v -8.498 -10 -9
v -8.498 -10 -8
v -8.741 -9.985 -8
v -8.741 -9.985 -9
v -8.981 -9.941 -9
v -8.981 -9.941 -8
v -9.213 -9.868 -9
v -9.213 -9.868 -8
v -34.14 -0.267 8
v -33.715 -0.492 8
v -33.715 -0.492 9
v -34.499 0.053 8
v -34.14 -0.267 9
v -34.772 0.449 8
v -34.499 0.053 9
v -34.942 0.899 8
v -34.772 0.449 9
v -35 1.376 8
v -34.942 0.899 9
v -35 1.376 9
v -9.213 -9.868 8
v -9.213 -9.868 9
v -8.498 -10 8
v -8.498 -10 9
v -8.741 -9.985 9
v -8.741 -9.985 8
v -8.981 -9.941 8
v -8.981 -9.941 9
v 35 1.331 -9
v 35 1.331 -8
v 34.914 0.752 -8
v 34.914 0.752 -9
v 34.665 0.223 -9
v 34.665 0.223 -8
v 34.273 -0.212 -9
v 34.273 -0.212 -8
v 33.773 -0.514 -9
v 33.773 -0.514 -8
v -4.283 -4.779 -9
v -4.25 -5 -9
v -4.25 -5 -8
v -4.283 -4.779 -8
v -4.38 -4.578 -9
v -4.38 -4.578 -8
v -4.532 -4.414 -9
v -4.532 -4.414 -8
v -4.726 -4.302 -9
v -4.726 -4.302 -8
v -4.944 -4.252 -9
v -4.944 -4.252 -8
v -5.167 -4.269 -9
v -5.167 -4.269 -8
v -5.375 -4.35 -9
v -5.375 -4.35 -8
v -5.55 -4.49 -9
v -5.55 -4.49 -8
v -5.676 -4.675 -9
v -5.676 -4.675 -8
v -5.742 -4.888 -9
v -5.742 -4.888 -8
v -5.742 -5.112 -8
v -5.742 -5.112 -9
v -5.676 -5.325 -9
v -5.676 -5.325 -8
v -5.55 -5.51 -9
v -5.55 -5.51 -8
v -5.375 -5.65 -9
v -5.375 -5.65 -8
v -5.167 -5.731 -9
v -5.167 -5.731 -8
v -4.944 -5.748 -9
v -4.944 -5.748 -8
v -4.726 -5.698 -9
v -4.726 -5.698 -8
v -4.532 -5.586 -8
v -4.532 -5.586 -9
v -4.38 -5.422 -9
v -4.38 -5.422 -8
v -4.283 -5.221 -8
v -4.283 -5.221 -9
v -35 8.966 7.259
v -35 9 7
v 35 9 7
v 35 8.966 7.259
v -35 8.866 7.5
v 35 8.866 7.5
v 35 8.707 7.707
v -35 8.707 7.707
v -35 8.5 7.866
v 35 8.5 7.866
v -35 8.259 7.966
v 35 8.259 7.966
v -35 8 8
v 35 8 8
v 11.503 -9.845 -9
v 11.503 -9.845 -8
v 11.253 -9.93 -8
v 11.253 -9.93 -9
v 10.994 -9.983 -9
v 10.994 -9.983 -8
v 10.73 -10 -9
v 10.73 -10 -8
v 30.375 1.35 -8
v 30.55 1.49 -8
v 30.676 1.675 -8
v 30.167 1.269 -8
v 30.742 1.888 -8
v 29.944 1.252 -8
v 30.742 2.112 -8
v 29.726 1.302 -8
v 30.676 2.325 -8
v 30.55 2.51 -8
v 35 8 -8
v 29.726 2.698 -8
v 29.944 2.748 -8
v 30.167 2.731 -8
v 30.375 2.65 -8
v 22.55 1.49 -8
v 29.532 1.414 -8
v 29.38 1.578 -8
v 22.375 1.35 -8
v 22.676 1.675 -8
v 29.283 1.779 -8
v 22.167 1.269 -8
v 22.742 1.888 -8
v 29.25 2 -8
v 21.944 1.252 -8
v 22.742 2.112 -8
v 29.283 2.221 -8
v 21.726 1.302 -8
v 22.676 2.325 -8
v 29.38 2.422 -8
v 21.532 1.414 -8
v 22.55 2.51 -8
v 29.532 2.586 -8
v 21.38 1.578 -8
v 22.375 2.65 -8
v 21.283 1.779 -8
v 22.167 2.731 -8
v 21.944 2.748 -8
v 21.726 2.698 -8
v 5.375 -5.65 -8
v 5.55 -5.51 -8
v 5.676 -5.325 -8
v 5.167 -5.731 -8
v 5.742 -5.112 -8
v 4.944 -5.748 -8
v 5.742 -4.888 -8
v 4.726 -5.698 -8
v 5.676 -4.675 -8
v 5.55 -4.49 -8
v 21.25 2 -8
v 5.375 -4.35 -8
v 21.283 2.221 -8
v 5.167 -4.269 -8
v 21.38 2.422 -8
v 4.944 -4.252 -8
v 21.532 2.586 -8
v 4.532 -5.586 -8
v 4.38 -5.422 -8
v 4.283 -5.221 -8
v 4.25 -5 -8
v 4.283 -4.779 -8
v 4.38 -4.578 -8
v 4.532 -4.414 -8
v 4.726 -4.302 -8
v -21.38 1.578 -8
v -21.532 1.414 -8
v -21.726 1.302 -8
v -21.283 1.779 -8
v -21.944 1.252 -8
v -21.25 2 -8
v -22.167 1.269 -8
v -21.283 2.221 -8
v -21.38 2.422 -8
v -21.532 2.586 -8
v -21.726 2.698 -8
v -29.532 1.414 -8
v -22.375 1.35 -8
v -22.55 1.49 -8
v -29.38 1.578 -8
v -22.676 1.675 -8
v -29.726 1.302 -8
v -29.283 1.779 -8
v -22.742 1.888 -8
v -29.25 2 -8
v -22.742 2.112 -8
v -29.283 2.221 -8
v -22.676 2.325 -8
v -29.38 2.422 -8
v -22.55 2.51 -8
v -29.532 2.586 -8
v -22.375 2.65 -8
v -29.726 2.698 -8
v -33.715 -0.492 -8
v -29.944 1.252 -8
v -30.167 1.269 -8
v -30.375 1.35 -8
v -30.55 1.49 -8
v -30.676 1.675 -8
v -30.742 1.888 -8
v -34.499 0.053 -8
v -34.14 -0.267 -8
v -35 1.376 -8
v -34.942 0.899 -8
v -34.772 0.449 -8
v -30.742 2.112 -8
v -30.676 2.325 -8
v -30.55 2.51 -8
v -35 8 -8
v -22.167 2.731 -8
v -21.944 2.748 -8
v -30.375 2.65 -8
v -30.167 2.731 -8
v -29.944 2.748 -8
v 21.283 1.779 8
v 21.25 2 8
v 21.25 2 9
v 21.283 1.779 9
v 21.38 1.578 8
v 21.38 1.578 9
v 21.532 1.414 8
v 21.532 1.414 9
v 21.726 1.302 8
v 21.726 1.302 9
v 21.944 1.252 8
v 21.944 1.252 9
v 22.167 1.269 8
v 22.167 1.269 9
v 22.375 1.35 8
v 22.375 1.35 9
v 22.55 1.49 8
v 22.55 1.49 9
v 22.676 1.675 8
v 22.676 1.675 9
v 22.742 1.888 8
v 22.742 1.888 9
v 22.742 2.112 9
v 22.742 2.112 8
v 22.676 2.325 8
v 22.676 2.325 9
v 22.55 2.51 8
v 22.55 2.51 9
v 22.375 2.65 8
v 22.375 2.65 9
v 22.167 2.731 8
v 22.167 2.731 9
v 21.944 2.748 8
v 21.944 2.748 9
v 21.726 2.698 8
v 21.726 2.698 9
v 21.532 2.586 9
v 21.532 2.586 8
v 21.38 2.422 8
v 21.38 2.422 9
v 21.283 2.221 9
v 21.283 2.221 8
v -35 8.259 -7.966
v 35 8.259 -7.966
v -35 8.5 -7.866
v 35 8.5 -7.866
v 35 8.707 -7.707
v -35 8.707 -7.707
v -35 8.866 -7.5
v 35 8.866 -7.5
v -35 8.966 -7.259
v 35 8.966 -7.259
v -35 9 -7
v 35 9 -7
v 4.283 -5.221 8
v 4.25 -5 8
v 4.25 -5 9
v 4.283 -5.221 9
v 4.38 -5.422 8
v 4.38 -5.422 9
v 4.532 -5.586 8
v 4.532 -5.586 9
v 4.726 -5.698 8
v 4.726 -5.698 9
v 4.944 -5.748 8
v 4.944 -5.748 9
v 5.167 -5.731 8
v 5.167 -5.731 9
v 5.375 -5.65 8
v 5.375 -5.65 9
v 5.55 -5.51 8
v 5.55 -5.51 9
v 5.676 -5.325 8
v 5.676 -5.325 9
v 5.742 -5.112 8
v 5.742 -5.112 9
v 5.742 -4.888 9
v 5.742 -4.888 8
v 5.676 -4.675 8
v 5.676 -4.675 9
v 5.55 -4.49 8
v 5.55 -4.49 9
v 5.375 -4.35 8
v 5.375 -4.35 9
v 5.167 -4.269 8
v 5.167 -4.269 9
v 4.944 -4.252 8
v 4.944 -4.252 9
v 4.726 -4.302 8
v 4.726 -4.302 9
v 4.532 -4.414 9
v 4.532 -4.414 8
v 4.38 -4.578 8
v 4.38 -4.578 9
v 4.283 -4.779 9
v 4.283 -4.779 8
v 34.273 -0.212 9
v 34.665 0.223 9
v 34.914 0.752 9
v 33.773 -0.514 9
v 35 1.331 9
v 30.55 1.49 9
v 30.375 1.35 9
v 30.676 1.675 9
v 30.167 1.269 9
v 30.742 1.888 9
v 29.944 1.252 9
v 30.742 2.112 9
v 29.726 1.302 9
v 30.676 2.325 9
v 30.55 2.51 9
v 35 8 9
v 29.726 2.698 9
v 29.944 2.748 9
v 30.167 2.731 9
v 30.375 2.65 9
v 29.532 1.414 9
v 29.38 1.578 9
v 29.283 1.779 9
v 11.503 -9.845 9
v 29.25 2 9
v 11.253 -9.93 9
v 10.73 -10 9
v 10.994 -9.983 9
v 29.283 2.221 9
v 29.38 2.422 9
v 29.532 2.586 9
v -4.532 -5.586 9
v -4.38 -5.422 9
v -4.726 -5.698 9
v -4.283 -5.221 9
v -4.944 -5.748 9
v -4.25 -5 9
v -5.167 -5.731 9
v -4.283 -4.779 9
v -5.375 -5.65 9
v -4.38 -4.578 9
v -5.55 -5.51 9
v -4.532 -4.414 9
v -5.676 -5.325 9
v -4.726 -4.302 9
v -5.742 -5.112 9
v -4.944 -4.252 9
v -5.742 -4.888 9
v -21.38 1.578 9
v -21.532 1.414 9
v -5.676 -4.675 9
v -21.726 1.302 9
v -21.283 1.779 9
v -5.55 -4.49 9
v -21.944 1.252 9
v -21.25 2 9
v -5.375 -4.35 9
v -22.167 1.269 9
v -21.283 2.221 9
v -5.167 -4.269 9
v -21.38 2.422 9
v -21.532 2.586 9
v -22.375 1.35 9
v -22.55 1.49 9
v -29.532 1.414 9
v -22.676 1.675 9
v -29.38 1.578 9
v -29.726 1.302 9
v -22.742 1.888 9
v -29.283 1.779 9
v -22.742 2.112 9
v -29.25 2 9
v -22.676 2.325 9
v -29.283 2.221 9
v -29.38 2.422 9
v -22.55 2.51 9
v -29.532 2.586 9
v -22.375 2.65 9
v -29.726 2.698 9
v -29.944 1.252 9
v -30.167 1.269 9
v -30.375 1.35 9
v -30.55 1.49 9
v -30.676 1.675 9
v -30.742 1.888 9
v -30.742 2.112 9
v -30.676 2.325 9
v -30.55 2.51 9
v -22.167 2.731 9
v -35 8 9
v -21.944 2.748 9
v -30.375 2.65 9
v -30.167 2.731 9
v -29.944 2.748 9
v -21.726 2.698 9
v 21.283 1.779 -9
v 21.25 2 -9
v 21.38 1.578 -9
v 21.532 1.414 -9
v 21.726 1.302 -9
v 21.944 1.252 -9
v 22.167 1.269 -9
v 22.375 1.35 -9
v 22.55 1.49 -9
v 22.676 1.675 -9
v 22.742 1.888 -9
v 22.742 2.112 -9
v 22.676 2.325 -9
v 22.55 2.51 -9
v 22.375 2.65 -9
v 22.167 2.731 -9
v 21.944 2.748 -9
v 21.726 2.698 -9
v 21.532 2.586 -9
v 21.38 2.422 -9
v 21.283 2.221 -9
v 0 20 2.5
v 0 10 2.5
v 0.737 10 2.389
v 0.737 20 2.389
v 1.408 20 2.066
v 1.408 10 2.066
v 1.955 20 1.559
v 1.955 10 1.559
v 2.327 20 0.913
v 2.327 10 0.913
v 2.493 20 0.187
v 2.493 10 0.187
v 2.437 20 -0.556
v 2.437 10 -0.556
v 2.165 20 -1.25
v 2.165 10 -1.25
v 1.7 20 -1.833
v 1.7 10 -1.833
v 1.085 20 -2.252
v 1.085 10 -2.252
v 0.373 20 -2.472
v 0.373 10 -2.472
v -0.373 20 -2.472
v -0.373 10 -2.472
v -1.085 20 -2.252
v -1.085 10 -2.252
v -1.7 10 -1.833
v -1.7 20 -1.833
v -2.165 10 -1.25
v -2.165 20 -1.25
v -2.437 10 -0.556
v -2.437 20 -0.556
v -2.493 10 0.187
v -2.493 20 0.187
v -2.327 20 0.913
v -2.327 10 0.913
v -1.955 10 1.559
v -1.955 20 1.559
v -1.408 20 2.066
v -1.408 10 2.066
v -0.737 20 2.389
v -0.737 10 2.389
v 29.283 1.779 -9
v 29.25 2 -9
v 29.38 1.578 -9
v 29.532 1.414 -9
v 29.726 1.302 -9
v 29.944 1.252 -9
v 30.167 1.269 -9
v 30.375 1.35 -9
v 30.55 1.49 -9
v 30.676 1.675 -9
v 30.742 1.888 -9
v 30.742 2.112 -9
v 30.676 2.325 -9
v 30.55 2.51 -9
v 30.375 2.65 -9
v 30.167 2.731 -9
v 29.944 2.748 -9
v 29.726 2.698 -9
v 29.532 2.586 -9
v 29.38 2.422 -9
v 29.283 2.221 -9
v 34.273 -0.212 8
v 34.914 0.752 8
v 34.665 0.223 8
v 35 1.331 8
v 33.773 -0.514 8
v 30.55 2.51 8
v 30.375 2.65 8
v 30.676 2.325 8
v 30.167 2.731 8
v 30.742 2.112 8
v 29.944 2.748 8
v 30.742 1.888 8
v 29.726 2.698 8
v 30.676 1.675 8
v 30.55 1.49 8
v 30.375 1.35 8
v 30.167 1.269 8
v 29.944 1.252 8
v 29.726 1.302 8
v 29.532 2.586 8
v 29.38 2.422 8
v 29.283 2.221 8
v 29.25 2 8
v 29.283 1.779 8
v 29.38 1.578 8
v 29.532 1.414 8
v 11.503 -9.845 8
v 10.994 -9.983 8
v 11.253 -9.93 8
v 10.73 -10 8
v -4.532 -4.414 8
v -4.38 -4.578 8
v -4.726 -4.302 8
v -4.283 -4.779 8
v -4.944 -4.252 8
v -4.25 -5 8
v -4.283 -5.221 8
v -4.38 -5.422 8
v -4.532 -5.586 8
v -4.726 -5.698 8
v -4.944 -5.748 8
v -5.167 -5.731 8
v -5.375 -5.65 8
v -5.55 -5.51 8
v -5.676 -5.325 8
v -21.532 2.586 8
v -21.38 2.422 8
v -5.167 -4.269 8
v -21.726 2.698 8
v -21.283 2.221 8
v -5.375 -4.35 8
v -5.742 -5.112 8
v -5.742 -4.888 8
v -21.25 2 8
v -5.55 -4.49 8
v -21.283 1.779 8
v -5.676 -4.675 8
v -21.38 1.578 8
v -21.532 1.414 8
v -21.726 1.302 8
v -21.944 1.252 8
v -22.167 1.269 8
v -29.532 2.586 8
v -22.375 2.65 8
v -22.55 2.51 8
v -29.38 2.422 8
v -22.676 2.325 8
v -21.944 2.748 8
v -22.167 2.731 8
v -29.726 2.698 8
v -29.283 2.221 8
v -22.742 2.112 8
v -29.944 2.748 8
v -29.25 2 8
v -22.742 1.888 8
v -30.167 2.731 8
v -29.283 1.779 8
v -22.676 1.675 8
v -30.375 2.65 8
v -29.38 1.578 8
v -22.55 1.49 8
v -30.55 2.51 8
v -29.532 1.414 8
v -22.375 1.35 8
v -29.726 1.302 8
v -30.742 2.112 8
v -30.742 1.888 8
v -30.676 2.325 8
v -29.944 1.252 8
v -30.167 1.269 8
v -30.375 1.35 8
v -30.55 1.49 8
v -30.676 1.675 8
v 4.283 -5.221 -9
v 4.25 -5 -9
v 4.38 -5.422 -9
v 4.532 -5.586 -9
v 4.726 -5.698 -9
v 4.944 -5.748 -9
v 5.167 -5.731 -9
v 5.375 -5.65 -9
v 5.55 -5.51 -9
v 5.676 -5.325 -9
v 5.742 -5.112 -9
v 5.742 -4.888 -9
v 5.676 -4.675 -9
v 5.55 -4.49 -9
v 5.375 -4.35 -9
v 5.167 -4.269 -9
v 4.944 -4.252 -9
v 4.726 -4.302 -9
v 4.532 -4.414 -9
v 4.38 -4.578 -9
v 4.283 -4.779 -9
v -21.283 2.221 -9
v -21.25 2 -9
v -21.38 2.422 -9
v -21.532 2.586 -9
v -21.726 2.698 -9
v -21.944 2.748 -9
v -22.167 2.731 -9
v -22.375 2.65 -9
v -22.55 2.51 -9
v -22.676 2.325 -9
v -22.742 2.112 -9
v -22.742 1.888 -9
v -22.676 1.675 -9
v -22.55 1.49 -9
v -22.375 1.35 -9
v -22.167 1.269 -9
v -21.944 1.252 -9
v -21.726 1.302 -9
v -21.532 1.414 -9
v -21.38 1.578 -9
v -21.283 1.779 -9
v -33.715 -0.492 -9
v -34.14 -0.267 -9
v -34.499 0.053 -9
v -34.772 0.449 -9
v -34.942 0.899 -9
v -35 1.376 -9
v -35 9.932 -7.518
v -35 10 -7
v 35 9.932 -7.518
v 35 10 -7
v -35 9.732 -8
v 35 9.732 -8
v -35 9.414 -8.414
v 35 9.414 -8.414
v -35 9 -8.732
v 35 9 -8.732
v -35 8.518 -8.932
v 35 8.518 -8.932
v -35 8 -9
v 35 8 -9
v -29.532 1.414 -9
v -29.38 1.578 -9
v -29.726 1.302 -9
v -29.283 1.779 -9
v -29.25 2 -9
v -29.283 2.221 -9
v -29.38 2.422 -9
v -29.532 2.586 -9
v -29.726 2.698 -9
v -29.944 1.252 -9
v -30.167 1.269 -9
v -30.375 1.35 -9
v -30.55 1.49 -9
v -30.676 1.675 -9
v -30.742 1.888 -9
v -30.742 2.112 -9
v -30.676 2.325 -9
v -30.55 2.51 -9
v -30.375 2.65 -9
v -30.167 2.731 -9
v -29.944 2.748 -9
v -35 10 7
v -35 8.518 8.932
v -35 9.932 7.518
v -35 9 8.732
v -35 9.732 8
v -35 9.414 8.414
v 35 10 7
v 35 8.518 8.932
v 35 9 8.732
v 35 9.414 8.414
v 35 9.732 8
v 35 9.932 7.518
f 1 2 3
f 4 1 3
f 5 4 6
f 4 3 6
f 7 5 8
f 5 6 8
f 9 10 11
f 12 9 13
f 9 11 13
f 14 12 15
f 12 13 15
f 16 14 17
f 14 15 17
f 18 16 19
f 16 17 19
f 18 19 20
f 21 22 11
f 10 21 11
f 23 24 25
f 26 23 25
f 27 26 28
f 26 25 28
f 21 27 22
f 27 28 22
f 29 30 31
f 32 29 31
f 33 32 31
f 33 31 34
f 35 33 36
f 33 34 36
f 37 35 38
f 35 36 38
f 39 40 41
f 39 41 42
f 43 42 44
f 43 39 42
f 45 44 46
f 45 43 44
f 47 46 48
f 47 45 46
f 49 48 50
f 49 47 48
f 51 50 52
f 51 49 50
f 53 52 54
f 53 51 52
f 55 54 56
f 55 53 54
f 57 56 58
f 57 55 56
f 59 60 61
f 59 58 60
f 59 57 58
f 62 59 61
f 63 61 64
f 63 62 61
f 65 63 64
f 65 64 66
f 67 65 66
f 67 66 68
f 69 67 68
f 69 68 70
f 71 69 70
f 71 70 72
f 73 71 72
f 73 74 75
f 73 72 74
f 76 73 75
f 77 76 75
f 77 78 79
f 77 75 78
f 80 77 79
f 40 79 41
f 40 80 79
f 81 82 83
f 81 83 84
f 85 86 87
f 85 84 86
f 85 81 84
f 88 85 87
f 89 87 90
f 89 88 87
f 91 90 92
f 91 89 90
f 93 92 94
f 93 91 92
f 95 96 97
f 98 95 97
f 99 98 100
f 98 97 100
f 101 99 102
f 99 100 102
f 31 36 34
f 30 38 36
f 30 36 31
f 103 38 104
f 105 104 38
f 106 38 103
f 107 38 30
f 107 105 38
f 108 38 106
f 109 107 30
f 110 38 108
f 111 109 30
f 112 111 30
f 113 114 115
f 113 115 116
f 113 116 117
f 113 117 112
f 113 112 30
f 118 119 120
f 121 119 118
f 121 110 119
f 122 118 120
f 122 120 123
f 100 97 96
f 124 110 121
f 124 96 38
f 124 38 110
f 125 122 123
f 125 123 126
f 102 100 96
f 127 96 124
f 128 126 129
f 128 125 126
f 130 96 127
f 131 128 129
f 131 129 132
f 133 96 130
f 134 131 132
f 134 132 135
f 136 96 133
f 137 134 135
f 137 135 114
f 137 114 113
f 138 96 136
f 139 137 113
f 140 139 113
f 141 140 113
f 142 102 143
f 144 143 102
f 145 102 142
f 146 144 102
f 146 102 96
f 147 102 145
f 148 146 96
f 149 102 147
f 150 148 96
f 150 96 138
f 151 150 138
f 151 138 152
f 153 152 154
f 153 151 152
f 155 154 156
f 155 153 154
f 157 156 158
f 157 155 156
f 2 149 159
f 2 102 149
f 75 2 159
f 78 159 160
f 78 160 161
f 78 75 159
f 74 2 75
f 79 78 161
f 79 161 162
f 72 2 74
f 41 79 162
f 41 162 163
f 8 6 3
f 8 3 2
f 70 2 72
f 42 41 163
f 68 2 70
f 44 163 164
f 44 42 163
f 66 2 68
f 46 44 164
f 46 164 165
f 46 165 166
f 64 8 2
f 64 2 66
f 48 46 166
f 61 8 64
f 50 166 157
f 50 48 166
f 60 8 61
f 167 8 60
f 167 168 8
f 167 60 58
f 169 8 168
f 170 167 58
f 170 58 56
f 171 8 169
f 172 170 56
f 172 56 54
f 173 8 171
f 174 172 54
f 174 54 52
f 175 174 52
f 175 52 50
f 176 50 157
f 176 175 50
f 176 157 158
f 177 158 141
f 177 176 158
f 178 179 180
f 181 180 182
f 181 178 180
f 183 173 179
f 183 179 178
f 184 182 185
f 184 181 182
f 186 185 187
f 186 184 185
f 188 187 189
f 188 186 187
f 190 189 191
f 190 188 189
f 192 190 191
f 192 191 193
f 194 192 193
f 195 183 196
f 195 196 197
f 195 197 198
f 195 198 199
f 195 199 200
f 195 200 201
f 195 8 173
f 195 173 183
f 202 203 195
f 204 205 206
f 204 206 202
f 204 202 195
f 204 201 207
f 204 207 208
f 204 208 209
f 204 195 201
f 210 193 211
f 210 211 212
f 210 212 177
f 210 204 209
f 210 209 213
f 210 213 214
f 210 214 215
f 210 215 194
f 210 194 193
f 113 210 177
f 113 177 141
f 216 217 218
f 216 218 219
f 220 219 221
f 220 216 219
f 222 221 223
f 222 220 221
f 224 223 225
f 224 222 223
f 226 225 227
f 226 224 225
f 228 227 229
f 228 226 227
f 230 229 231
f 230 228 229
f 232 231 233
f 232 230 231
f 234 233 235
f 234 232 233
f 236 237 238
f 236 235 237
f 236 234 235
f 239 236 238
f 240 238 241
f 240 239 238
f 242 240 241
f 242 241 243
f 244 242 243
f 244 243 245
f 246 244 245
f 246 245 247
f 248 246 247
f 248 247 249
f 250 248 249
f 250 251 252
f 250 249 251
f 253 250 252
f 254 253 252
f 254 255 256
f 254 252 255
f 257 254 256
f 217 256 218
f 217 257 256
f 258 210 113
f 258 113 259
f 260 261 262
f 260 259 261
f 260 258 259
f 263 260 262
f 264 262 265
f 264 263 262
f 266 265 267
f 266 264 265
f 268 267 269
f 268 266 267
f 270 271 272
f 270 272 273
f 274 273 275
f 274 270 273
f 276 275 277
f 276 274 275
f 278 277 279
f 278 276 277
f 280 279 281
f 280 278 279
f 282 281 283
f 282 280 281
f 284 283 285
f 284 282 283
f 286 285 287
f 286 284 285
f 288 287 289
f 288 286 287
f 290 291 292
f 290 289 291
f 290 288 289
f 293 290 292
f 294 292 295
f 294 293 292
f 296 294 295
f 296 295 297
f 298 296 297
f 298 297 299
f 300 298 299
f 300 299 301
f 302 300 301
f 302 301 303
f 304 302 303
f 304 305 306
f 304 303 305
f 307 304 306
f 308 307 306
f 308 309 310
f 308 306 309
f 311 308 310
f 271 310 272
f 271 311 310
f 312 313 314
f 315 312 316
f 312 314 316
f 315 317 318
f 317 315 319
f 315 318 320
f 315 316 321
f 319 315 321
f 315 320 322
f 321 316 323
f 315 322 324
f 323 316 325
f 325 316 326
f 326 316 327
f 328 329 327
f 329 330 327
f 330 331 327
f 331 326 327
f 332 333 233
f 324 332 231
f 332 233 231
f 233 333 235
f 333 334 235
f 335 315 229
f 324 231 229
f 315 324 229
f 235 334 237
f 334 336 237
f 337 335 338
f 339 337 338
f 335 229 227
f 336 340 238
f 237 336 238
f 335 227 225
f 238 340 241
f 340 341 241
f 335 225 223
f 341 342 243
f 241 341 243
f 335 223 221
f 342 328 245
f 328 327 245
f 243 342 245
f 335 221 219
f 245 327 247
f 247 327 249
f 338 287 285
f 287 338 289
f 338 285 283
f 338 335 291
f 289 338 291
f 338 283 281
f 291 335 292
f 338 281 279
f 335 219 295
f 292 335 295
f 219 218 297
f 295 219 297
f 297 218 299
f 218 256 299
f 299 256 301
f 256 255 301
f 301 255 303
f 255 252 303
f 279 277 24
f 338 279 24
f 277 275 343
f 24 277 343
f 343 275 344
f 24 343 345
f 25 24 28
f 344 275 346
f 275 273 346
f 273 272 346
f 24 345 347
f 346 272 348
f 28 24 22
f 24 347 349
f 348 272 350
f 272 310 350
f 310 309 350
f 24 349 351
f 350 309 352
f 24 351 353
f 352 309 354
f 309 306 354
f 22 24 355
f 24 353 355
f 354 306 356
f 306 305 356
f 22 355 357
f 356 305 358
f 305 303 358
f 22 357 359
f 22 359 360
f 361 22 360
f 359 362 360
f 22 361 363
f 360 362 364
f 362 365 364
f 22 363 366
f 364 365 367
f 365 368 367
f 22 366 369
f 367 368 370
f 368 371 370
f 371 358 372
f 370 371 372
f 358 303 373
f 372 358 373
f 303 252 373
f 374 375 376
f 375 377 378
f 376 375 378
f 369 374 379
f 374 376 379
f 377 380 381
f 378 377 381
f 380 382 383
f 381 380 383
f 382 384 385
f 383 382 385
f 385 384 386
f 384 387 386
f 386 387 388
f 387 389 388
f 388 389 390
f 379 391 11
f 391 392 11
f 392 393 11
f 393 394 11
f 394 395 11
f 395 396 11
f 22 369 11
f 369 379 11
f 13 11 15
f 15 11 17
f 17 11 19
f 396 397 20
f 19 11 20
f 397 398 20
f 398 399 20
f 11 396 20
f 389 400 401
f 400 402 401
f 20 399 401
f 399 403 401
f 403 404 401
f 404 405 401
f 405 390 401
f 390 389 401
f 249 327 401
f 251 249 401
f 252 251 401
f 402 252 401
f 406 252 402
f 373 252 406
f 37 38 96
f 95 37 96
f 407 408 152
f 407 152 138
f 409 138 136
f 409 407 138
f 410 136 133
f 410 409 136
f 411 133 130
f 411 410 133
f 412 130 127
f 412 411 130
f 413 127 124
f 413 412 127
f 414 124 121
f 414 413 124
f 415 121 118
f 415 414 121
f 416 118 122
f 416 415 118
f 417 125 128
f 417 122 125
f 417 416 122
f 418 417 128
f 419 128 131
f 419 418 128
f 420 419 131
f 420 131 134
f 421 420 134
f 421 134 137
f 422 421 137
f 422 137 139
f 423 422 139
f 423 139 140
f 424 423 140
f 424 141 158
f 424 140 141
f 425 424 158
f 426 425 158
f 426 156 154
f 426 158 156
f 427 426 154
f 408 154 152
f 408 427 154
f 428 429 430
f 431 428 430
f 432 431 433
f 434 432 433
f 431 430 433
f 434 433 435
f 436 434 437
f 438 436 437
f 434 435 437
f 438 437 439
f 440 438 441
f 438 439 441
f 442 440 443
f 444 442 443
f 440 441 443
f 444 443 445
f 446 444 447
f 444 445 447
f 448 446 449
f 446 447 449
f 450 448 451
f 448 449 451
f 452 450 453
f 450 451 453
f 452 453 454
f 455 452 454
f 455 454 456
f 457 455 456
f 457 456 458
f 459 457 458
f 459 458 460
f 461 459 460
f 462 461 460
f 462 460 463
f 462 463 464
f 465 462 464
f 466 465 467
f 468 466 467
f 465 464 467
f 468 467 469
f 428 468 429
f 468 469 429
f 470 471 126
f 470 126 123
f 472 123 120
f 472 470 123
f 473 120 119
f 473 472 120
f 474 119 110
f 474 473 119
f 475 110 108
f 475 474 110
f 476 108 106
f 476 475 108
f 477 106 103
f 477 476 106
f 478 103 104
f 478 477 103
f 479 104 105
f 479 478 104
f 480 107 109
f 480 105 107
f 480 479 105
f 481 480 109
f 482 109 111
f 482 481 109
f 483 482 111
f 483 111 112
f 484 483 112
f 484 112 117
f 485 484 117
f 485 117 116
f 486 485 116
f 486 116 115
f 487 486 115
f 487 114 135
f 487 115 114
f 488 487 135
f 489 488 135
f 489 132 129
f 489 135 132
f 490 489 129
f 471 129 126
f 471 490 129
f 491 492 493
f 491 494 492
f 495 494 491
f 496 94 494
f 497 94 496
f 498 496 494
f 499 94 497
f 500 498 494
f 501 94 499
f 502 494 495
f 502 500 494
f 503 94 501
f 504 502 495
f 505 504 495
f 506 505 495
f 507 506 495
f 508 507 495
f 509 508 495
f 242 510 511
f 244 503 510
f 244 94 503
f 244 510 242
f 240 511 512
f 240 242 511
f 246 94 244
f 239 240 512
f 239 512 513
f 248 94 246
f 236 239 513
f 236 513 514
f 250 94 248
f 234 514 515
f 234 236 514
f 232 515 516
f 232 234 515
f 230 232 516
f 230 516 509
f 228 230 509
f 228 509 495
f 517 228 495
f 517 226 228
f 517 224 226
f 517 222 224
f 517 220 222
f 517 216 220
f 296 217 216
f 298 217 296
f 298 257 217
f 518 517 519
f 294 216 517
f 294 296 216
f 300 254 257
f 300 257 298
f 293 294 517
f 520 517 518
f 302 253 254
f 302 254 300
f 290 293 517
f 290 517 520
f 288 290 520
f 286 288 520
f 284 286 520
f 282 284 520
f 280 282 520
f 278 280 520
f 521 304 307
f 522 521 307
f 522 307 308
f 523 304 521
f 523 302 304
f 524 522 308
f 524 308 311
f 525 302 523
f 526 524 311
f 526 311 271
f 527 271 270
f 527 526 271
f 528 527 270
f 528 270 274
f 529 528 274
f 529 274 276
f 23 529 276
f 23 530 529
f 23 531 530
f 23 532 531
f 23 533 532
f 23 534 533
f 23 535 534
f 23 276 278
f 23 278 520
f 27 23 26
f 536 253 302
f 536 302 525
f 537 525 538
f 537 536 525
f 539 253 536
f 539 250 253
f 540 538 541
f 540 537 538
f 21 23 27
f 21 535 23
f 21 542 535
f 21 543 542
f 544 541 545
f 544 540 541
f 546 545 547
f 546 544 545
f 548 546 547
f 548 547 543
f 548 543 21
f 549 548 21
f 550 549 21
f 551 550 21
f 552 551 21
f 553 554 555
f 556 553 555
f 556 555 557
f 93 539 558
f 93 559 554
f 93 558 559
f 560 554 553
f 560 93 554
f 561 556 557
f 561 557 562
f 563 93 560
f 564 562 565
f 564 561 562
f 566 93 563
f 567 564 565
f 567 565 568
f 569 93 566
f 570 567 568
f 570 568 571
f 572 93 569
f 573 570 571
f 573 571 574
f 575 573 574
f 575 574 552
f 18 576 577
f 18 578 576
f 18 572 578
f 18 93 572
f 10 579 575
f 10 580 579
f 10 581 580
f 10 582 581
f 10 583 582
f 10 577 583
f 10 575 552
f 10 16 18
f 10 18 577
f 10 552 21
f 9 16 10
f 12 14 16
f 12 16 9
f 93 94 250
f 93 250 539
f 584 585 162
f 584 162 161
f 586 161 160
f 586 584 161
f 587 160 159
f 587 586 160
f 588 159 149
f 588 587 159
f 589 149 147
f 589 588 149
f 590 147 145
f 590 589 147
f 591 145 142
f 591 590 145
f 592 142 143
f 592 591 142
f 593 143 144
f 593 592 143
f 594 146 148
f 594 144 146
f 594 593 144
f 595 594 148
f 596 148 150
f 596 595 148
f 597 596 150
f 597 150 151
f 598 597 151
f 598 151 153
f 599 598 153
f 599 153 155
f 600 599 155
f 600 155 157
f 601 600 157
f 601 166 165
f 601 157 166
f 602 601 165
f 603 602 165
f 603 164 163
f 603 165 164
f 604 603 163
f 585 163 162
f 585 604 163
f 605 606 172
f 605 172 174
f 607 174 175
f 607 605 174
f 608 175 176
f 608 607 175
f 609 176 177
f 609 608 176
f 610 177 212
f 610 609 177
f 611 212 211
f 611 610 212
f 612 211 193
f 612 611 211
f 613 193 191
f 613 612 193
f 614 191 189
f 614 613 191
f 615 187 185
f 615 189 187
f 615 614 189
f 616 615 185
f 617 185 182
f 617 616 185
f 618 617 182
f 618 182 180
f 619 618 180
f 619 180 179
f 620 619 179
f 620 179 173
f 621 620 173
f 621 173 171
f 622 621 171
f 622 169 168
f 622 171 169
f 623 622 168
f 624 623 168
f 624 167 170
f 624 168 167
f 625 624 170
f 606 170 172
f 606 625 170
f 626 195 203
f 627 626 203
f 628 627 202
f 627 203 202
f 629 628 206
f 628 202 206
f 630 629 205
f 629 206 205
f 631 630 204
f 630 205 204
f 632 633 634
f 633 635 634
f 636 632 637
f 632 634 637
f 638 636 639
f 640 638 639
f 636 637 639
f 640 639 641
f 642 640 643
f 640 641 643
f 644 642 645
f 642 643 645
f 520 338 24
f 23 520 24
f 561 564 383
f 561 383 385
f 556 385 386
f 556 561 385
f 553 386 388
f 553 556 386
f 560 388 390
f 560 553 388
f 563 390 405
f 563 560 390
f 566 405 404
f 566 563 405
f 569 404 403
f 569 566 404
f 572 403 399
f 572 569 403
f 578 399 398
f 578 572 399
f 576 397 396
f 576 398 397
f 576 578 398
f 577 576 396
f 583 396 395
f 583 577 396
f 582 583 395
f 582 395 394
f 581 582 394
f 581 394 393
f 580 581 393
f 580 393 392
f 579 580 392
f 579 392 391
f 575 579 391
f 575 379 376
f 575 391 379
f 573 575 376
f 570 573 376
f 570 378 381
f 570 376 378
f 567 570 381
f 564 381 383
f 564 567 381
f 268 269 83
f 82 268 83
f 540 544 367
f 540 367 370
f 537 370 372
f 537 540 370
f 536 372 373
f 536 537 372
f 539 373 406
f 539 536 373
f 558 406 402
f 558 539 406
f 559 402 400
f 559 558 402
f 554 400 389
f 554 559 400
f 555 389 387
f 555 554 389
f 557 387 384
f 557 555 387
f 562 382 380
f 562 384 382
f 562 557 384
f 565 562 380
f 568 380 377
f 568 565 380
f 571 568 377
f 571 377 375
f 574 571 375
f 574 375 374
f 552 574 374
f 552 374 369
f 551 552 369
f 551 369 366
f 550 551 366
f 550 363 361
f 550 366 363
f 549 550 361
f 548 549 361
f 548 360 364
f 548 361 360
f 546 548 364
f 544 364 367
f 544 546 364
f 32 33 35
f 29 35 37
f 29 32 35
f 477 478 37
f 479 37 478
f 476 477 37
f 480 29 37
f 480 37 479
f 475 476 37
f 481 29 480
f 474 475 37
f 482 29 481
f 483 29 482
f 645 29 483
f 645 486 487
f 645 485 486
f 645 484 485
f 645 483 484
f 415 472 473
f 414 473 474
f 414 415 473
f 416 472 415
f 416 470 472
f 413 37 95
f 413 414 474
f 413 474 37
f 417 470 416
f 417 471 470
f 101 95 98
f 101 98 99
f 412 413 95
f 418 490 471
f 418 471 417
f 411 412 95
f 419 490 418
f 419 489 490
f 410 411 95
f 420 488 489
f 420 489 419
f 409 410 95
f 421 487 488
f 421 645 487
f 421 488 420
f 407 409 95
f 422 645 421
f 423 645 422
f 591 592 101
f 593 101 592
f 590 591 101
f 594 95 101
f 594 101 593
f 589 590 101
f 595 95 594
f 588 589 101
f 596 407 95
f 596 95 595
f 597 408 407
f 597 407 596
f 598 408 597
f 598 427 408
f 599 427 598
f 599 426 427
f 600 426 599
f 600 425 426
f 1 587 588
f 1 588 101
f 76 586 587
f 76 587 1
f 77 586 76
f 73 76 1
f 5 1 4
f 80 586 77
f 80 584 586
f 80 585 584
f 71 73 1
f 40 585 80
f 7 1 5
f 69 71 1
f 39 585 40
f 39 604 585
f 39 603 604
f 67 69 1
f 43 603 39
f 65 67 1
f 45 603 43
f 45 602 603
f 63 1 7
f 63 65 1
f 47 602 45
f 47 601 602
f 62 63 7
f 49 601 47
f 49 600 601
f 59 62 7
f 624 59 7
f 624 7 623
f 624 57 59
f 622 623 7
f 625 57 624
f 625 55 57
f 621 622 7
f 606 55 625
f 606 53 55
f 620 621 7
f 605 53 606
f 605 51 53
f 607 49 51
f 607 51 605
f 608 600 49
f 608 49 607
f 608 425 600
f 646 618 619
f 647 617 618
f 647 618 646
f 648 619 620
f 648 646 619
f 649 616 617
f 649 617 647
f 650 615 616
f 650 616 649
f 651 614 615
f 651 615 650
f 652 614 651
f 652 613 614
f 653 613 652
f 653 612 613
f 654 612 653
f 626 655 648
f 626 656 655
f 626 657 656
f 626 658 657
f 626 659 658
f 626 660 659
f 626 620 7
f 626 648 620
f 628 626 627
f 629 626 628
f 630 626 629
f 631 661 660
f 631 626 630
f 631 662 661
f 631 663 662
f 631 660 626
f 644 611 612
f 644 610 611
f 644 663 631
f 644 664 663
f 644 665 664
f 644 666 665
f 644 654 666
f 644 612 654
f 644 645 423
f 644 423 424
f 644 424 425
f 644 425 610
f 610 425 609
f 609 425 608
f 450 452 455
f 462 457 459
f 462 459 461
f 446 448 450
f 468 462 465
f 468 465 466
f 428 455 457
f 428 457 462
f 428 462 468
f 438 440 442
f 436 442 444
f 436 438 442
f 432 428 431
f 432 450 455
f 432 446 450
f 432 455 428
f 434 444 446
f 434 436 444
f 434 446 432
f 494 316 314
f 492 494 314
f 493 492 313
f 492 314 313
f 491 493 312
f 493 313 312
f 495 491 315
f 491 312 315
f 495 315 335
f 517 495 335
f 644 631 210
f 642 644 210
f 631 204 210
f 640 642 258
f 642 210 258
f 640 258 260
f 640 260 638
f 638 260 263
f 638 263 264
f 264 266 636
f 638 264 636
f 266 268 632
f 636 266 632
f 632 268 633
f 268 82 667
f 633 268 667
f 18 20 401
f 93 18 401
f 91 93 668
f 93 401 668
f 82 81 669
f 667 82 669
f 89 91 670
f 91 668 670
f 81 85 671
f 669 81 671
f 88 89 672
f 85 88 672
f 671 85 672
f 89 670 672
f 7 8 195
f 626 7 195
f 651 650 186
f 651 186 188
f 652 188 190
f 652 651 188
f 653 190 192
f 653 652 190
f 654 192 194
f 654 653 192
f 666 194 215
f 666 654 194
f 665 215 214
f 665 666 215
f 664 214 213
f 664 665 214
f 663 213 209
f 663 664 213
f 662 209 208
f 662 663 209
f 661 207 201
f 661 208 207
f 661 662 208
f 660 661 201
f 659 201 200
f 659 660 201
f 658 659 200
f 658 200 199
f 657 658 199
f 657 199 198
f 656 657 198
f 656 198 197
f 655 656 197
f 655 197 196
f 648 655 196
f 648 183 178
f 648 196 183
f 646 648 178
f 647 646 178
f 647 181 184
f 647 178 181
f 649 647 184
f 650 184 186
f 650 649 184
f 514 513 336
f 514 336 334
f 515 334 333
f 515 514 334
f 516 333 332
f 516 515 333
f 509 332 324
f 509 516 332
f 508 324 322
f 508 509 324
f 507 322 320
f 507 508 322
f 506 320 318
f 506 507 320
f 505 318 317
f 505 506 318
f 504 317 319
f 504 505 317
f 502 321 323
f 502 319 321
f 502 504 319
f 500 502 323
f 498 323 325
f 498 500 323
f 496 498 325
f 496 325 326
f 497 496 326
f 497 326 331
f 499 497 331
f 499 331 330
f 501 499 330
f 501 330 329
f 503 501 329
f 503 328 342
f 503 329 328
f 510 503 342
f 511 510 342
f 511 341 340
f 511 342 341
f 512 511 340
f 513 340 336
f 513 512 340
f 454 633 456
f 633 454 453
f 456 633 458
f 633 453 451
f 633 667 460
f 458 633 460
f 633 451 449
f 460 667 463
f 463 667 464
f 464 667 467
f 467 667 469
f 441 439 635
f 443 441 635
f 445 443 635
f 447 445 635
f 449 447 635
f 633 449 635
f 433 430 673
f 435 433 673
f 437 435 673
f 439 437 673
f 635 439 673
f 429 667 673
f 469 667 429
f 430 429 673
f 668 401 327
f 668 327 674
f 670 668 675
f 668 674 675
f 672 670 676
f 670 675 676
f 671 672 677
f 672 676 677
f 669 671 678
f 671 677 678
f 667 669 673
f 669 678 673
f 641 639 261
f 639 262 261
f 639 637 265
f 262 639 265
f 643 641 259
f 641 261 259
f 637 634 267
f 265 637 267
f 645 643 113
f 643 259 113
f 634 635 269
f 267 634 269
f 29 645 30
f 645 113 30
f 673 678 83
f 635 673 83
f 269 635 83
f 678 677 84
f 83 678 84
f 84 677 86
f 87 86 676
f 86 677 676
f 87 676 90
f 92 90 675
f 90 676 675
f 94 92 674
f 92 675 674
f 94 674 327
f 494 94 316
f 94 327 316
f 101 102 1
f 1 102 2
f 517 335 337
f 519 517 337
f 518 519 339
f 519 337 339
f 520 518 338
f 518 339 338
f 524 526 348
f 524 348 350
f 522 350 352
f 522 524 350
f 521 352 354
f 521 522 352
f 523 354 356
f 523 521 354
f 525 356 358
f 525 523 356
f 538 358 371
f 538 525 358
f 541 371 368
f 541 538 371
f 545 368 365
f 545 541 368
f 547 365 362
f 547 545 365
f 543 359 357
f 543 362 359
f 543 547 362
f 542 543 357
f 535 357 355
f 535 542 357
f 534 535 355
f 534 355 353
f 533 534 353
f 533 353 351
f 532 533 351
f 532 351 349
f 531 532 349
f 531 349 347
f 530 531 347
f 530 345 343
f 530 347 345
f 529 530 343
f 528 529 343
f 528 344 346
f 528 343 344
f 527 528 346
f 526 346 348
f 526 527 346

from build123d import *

# Parameters (mm, degrees)
BOSS_EXTRUDE1_DEPTH     = 9
FILLET1_R               = 2
CUT_EXTRUDE1_DEPTH      = 38.496666519
CUT_EXTRUDE1_DEPTH_BACK = 38.496666519
SKETCH3_R               = 2.5
BOSS_EXTRUDE2_DEPTH     = 10
CUT_EXTRUDE2_DEPTH      = 42.303752856
CUT_EXTRUDE2_DEPTH_BACK = 42.303752856
SKETCH4_R               = 0.75


with BuildPart() as part:
    # Sketch1 → Boss-Extrude1 (new, symmetric)
    with BuildSketch(Plane.XY):
        with BuildLine():
            ThreePointArc((-33.714795211, -0.491812162), (-34.647663561, 0.242423764), (-35, 1.376092494))
            Line((-35, 1.376092494), (-35, 10))
            Line((-35, 10), (35, 10))
            Line((35, 10), (35, 1.330500849))
            ThreePointArc((35, 1.330500849), (34.665188238, 0.222733667), (33.772851869, -0.514140034))
            Line((33.772851869, -0.514140034), (11.50283608, -9.844640883))
            ThreePointArc((11.50283608, -9.844640883), (11.12414042, -9.960775582), (10.729984211, -10))
            Line((10.729984211, -10), (-8.498371341, -10))
            ThreePointArc((-8.498371341, -10), (-8.861820571, -9.966698924), (-9.213166552, -9.867904657))
            Line((-9.213166552, -9.867904657), (-33.714795211, -0.491812162))
        make_face()
    extrude(amount=BOSS_EXTRUDE1_DEPTH, both=True)

    # Fillet1
    fillet1_edges = [part.edges().sort_by_distance(p)[0] for p in [
        (0, 10, -9),
        (0, 10, 9),
    ]]
    fillet(fillet1_edges, radius=FILLET1_R)

    # Sketch2 → Cut-Extrude1 (cut, two sides: drawn at the far end of the back side and taken through both)
    with BuildSketch(Plane(origin=(0, 0, 0), x_dir=(0, 0, -1), z_dir=(1, 0, 0)).offset(-CUT_EXTRUDE1_DEPTH_BACK)):
        with BuildLine():
            Line((-8, 8), (-8, -14.234256749))
            Line((-8, -14.234256749), (8, -14.234256749))
            Line((8, -14.234256749), (8, 1.330500849))
            Line((8, 1.330500849), (8, 8))
            ThreePointArc((8, 8), (7.707106781, 8.707106781), (7, 9))
            Line((7, 9), (-7, 9))
            ThreePointArc((-7, 9), (-7.707106781, 8.707106781), (-8, 8))
        make_face()
    extrude(amount=CUT_EXTRUDE1_DEPTH + CUT_EXTRUDE1_DEPTH_BACK, mode=Mode.SUBTRACT)

    # Sketch3 → Boss-Extrude2 (add)
    with BuildSketch(Plane(origin=(0, 10, 0), x_dir=(1, 0, 0), z_dir=(0, 1, 0))):
        with Locations(Location((0, 0, 0), (0, 0, 270))):
            Circle(SKETCH3_R)
    extrude(amount=BOSS_EXTRUDE2_DEPTH)

    # Sketch4 → Cut-Extrude2 (cut, two sides: drawn at the far end of the back side and taken through both)
    with BuildSketch(Plane.XY.offset(-CUT_EXTRUDE2_DEPTH_BACK)):
        with Locations((-30, 2)):
            Circle(SKETCH4_R)
        with Locations((-22, 2)):
            Circle(SKETCH4_R)
        with Locations((-5, -5)):
            Circle(SKETCH4_R)
        with Locations(Location((5, -5, 0), (0, 0, 180))):
            Circle(SKETCH4_R)
        with Locations(Location((22, 2, 0), (0, 0, 180))):
            Circle(SKETCH4_R)
        with Locations(Location((30, 2, 0), (0, 0, 180))):
            Circle(SKETCH4_R)
    extrude(amount=CUT_EXTRUDE2_DEPTH + CUT_EXTRUDE2_DEPTH_BACK, mode=Mode.SUBTRACT)


solid = part.part
